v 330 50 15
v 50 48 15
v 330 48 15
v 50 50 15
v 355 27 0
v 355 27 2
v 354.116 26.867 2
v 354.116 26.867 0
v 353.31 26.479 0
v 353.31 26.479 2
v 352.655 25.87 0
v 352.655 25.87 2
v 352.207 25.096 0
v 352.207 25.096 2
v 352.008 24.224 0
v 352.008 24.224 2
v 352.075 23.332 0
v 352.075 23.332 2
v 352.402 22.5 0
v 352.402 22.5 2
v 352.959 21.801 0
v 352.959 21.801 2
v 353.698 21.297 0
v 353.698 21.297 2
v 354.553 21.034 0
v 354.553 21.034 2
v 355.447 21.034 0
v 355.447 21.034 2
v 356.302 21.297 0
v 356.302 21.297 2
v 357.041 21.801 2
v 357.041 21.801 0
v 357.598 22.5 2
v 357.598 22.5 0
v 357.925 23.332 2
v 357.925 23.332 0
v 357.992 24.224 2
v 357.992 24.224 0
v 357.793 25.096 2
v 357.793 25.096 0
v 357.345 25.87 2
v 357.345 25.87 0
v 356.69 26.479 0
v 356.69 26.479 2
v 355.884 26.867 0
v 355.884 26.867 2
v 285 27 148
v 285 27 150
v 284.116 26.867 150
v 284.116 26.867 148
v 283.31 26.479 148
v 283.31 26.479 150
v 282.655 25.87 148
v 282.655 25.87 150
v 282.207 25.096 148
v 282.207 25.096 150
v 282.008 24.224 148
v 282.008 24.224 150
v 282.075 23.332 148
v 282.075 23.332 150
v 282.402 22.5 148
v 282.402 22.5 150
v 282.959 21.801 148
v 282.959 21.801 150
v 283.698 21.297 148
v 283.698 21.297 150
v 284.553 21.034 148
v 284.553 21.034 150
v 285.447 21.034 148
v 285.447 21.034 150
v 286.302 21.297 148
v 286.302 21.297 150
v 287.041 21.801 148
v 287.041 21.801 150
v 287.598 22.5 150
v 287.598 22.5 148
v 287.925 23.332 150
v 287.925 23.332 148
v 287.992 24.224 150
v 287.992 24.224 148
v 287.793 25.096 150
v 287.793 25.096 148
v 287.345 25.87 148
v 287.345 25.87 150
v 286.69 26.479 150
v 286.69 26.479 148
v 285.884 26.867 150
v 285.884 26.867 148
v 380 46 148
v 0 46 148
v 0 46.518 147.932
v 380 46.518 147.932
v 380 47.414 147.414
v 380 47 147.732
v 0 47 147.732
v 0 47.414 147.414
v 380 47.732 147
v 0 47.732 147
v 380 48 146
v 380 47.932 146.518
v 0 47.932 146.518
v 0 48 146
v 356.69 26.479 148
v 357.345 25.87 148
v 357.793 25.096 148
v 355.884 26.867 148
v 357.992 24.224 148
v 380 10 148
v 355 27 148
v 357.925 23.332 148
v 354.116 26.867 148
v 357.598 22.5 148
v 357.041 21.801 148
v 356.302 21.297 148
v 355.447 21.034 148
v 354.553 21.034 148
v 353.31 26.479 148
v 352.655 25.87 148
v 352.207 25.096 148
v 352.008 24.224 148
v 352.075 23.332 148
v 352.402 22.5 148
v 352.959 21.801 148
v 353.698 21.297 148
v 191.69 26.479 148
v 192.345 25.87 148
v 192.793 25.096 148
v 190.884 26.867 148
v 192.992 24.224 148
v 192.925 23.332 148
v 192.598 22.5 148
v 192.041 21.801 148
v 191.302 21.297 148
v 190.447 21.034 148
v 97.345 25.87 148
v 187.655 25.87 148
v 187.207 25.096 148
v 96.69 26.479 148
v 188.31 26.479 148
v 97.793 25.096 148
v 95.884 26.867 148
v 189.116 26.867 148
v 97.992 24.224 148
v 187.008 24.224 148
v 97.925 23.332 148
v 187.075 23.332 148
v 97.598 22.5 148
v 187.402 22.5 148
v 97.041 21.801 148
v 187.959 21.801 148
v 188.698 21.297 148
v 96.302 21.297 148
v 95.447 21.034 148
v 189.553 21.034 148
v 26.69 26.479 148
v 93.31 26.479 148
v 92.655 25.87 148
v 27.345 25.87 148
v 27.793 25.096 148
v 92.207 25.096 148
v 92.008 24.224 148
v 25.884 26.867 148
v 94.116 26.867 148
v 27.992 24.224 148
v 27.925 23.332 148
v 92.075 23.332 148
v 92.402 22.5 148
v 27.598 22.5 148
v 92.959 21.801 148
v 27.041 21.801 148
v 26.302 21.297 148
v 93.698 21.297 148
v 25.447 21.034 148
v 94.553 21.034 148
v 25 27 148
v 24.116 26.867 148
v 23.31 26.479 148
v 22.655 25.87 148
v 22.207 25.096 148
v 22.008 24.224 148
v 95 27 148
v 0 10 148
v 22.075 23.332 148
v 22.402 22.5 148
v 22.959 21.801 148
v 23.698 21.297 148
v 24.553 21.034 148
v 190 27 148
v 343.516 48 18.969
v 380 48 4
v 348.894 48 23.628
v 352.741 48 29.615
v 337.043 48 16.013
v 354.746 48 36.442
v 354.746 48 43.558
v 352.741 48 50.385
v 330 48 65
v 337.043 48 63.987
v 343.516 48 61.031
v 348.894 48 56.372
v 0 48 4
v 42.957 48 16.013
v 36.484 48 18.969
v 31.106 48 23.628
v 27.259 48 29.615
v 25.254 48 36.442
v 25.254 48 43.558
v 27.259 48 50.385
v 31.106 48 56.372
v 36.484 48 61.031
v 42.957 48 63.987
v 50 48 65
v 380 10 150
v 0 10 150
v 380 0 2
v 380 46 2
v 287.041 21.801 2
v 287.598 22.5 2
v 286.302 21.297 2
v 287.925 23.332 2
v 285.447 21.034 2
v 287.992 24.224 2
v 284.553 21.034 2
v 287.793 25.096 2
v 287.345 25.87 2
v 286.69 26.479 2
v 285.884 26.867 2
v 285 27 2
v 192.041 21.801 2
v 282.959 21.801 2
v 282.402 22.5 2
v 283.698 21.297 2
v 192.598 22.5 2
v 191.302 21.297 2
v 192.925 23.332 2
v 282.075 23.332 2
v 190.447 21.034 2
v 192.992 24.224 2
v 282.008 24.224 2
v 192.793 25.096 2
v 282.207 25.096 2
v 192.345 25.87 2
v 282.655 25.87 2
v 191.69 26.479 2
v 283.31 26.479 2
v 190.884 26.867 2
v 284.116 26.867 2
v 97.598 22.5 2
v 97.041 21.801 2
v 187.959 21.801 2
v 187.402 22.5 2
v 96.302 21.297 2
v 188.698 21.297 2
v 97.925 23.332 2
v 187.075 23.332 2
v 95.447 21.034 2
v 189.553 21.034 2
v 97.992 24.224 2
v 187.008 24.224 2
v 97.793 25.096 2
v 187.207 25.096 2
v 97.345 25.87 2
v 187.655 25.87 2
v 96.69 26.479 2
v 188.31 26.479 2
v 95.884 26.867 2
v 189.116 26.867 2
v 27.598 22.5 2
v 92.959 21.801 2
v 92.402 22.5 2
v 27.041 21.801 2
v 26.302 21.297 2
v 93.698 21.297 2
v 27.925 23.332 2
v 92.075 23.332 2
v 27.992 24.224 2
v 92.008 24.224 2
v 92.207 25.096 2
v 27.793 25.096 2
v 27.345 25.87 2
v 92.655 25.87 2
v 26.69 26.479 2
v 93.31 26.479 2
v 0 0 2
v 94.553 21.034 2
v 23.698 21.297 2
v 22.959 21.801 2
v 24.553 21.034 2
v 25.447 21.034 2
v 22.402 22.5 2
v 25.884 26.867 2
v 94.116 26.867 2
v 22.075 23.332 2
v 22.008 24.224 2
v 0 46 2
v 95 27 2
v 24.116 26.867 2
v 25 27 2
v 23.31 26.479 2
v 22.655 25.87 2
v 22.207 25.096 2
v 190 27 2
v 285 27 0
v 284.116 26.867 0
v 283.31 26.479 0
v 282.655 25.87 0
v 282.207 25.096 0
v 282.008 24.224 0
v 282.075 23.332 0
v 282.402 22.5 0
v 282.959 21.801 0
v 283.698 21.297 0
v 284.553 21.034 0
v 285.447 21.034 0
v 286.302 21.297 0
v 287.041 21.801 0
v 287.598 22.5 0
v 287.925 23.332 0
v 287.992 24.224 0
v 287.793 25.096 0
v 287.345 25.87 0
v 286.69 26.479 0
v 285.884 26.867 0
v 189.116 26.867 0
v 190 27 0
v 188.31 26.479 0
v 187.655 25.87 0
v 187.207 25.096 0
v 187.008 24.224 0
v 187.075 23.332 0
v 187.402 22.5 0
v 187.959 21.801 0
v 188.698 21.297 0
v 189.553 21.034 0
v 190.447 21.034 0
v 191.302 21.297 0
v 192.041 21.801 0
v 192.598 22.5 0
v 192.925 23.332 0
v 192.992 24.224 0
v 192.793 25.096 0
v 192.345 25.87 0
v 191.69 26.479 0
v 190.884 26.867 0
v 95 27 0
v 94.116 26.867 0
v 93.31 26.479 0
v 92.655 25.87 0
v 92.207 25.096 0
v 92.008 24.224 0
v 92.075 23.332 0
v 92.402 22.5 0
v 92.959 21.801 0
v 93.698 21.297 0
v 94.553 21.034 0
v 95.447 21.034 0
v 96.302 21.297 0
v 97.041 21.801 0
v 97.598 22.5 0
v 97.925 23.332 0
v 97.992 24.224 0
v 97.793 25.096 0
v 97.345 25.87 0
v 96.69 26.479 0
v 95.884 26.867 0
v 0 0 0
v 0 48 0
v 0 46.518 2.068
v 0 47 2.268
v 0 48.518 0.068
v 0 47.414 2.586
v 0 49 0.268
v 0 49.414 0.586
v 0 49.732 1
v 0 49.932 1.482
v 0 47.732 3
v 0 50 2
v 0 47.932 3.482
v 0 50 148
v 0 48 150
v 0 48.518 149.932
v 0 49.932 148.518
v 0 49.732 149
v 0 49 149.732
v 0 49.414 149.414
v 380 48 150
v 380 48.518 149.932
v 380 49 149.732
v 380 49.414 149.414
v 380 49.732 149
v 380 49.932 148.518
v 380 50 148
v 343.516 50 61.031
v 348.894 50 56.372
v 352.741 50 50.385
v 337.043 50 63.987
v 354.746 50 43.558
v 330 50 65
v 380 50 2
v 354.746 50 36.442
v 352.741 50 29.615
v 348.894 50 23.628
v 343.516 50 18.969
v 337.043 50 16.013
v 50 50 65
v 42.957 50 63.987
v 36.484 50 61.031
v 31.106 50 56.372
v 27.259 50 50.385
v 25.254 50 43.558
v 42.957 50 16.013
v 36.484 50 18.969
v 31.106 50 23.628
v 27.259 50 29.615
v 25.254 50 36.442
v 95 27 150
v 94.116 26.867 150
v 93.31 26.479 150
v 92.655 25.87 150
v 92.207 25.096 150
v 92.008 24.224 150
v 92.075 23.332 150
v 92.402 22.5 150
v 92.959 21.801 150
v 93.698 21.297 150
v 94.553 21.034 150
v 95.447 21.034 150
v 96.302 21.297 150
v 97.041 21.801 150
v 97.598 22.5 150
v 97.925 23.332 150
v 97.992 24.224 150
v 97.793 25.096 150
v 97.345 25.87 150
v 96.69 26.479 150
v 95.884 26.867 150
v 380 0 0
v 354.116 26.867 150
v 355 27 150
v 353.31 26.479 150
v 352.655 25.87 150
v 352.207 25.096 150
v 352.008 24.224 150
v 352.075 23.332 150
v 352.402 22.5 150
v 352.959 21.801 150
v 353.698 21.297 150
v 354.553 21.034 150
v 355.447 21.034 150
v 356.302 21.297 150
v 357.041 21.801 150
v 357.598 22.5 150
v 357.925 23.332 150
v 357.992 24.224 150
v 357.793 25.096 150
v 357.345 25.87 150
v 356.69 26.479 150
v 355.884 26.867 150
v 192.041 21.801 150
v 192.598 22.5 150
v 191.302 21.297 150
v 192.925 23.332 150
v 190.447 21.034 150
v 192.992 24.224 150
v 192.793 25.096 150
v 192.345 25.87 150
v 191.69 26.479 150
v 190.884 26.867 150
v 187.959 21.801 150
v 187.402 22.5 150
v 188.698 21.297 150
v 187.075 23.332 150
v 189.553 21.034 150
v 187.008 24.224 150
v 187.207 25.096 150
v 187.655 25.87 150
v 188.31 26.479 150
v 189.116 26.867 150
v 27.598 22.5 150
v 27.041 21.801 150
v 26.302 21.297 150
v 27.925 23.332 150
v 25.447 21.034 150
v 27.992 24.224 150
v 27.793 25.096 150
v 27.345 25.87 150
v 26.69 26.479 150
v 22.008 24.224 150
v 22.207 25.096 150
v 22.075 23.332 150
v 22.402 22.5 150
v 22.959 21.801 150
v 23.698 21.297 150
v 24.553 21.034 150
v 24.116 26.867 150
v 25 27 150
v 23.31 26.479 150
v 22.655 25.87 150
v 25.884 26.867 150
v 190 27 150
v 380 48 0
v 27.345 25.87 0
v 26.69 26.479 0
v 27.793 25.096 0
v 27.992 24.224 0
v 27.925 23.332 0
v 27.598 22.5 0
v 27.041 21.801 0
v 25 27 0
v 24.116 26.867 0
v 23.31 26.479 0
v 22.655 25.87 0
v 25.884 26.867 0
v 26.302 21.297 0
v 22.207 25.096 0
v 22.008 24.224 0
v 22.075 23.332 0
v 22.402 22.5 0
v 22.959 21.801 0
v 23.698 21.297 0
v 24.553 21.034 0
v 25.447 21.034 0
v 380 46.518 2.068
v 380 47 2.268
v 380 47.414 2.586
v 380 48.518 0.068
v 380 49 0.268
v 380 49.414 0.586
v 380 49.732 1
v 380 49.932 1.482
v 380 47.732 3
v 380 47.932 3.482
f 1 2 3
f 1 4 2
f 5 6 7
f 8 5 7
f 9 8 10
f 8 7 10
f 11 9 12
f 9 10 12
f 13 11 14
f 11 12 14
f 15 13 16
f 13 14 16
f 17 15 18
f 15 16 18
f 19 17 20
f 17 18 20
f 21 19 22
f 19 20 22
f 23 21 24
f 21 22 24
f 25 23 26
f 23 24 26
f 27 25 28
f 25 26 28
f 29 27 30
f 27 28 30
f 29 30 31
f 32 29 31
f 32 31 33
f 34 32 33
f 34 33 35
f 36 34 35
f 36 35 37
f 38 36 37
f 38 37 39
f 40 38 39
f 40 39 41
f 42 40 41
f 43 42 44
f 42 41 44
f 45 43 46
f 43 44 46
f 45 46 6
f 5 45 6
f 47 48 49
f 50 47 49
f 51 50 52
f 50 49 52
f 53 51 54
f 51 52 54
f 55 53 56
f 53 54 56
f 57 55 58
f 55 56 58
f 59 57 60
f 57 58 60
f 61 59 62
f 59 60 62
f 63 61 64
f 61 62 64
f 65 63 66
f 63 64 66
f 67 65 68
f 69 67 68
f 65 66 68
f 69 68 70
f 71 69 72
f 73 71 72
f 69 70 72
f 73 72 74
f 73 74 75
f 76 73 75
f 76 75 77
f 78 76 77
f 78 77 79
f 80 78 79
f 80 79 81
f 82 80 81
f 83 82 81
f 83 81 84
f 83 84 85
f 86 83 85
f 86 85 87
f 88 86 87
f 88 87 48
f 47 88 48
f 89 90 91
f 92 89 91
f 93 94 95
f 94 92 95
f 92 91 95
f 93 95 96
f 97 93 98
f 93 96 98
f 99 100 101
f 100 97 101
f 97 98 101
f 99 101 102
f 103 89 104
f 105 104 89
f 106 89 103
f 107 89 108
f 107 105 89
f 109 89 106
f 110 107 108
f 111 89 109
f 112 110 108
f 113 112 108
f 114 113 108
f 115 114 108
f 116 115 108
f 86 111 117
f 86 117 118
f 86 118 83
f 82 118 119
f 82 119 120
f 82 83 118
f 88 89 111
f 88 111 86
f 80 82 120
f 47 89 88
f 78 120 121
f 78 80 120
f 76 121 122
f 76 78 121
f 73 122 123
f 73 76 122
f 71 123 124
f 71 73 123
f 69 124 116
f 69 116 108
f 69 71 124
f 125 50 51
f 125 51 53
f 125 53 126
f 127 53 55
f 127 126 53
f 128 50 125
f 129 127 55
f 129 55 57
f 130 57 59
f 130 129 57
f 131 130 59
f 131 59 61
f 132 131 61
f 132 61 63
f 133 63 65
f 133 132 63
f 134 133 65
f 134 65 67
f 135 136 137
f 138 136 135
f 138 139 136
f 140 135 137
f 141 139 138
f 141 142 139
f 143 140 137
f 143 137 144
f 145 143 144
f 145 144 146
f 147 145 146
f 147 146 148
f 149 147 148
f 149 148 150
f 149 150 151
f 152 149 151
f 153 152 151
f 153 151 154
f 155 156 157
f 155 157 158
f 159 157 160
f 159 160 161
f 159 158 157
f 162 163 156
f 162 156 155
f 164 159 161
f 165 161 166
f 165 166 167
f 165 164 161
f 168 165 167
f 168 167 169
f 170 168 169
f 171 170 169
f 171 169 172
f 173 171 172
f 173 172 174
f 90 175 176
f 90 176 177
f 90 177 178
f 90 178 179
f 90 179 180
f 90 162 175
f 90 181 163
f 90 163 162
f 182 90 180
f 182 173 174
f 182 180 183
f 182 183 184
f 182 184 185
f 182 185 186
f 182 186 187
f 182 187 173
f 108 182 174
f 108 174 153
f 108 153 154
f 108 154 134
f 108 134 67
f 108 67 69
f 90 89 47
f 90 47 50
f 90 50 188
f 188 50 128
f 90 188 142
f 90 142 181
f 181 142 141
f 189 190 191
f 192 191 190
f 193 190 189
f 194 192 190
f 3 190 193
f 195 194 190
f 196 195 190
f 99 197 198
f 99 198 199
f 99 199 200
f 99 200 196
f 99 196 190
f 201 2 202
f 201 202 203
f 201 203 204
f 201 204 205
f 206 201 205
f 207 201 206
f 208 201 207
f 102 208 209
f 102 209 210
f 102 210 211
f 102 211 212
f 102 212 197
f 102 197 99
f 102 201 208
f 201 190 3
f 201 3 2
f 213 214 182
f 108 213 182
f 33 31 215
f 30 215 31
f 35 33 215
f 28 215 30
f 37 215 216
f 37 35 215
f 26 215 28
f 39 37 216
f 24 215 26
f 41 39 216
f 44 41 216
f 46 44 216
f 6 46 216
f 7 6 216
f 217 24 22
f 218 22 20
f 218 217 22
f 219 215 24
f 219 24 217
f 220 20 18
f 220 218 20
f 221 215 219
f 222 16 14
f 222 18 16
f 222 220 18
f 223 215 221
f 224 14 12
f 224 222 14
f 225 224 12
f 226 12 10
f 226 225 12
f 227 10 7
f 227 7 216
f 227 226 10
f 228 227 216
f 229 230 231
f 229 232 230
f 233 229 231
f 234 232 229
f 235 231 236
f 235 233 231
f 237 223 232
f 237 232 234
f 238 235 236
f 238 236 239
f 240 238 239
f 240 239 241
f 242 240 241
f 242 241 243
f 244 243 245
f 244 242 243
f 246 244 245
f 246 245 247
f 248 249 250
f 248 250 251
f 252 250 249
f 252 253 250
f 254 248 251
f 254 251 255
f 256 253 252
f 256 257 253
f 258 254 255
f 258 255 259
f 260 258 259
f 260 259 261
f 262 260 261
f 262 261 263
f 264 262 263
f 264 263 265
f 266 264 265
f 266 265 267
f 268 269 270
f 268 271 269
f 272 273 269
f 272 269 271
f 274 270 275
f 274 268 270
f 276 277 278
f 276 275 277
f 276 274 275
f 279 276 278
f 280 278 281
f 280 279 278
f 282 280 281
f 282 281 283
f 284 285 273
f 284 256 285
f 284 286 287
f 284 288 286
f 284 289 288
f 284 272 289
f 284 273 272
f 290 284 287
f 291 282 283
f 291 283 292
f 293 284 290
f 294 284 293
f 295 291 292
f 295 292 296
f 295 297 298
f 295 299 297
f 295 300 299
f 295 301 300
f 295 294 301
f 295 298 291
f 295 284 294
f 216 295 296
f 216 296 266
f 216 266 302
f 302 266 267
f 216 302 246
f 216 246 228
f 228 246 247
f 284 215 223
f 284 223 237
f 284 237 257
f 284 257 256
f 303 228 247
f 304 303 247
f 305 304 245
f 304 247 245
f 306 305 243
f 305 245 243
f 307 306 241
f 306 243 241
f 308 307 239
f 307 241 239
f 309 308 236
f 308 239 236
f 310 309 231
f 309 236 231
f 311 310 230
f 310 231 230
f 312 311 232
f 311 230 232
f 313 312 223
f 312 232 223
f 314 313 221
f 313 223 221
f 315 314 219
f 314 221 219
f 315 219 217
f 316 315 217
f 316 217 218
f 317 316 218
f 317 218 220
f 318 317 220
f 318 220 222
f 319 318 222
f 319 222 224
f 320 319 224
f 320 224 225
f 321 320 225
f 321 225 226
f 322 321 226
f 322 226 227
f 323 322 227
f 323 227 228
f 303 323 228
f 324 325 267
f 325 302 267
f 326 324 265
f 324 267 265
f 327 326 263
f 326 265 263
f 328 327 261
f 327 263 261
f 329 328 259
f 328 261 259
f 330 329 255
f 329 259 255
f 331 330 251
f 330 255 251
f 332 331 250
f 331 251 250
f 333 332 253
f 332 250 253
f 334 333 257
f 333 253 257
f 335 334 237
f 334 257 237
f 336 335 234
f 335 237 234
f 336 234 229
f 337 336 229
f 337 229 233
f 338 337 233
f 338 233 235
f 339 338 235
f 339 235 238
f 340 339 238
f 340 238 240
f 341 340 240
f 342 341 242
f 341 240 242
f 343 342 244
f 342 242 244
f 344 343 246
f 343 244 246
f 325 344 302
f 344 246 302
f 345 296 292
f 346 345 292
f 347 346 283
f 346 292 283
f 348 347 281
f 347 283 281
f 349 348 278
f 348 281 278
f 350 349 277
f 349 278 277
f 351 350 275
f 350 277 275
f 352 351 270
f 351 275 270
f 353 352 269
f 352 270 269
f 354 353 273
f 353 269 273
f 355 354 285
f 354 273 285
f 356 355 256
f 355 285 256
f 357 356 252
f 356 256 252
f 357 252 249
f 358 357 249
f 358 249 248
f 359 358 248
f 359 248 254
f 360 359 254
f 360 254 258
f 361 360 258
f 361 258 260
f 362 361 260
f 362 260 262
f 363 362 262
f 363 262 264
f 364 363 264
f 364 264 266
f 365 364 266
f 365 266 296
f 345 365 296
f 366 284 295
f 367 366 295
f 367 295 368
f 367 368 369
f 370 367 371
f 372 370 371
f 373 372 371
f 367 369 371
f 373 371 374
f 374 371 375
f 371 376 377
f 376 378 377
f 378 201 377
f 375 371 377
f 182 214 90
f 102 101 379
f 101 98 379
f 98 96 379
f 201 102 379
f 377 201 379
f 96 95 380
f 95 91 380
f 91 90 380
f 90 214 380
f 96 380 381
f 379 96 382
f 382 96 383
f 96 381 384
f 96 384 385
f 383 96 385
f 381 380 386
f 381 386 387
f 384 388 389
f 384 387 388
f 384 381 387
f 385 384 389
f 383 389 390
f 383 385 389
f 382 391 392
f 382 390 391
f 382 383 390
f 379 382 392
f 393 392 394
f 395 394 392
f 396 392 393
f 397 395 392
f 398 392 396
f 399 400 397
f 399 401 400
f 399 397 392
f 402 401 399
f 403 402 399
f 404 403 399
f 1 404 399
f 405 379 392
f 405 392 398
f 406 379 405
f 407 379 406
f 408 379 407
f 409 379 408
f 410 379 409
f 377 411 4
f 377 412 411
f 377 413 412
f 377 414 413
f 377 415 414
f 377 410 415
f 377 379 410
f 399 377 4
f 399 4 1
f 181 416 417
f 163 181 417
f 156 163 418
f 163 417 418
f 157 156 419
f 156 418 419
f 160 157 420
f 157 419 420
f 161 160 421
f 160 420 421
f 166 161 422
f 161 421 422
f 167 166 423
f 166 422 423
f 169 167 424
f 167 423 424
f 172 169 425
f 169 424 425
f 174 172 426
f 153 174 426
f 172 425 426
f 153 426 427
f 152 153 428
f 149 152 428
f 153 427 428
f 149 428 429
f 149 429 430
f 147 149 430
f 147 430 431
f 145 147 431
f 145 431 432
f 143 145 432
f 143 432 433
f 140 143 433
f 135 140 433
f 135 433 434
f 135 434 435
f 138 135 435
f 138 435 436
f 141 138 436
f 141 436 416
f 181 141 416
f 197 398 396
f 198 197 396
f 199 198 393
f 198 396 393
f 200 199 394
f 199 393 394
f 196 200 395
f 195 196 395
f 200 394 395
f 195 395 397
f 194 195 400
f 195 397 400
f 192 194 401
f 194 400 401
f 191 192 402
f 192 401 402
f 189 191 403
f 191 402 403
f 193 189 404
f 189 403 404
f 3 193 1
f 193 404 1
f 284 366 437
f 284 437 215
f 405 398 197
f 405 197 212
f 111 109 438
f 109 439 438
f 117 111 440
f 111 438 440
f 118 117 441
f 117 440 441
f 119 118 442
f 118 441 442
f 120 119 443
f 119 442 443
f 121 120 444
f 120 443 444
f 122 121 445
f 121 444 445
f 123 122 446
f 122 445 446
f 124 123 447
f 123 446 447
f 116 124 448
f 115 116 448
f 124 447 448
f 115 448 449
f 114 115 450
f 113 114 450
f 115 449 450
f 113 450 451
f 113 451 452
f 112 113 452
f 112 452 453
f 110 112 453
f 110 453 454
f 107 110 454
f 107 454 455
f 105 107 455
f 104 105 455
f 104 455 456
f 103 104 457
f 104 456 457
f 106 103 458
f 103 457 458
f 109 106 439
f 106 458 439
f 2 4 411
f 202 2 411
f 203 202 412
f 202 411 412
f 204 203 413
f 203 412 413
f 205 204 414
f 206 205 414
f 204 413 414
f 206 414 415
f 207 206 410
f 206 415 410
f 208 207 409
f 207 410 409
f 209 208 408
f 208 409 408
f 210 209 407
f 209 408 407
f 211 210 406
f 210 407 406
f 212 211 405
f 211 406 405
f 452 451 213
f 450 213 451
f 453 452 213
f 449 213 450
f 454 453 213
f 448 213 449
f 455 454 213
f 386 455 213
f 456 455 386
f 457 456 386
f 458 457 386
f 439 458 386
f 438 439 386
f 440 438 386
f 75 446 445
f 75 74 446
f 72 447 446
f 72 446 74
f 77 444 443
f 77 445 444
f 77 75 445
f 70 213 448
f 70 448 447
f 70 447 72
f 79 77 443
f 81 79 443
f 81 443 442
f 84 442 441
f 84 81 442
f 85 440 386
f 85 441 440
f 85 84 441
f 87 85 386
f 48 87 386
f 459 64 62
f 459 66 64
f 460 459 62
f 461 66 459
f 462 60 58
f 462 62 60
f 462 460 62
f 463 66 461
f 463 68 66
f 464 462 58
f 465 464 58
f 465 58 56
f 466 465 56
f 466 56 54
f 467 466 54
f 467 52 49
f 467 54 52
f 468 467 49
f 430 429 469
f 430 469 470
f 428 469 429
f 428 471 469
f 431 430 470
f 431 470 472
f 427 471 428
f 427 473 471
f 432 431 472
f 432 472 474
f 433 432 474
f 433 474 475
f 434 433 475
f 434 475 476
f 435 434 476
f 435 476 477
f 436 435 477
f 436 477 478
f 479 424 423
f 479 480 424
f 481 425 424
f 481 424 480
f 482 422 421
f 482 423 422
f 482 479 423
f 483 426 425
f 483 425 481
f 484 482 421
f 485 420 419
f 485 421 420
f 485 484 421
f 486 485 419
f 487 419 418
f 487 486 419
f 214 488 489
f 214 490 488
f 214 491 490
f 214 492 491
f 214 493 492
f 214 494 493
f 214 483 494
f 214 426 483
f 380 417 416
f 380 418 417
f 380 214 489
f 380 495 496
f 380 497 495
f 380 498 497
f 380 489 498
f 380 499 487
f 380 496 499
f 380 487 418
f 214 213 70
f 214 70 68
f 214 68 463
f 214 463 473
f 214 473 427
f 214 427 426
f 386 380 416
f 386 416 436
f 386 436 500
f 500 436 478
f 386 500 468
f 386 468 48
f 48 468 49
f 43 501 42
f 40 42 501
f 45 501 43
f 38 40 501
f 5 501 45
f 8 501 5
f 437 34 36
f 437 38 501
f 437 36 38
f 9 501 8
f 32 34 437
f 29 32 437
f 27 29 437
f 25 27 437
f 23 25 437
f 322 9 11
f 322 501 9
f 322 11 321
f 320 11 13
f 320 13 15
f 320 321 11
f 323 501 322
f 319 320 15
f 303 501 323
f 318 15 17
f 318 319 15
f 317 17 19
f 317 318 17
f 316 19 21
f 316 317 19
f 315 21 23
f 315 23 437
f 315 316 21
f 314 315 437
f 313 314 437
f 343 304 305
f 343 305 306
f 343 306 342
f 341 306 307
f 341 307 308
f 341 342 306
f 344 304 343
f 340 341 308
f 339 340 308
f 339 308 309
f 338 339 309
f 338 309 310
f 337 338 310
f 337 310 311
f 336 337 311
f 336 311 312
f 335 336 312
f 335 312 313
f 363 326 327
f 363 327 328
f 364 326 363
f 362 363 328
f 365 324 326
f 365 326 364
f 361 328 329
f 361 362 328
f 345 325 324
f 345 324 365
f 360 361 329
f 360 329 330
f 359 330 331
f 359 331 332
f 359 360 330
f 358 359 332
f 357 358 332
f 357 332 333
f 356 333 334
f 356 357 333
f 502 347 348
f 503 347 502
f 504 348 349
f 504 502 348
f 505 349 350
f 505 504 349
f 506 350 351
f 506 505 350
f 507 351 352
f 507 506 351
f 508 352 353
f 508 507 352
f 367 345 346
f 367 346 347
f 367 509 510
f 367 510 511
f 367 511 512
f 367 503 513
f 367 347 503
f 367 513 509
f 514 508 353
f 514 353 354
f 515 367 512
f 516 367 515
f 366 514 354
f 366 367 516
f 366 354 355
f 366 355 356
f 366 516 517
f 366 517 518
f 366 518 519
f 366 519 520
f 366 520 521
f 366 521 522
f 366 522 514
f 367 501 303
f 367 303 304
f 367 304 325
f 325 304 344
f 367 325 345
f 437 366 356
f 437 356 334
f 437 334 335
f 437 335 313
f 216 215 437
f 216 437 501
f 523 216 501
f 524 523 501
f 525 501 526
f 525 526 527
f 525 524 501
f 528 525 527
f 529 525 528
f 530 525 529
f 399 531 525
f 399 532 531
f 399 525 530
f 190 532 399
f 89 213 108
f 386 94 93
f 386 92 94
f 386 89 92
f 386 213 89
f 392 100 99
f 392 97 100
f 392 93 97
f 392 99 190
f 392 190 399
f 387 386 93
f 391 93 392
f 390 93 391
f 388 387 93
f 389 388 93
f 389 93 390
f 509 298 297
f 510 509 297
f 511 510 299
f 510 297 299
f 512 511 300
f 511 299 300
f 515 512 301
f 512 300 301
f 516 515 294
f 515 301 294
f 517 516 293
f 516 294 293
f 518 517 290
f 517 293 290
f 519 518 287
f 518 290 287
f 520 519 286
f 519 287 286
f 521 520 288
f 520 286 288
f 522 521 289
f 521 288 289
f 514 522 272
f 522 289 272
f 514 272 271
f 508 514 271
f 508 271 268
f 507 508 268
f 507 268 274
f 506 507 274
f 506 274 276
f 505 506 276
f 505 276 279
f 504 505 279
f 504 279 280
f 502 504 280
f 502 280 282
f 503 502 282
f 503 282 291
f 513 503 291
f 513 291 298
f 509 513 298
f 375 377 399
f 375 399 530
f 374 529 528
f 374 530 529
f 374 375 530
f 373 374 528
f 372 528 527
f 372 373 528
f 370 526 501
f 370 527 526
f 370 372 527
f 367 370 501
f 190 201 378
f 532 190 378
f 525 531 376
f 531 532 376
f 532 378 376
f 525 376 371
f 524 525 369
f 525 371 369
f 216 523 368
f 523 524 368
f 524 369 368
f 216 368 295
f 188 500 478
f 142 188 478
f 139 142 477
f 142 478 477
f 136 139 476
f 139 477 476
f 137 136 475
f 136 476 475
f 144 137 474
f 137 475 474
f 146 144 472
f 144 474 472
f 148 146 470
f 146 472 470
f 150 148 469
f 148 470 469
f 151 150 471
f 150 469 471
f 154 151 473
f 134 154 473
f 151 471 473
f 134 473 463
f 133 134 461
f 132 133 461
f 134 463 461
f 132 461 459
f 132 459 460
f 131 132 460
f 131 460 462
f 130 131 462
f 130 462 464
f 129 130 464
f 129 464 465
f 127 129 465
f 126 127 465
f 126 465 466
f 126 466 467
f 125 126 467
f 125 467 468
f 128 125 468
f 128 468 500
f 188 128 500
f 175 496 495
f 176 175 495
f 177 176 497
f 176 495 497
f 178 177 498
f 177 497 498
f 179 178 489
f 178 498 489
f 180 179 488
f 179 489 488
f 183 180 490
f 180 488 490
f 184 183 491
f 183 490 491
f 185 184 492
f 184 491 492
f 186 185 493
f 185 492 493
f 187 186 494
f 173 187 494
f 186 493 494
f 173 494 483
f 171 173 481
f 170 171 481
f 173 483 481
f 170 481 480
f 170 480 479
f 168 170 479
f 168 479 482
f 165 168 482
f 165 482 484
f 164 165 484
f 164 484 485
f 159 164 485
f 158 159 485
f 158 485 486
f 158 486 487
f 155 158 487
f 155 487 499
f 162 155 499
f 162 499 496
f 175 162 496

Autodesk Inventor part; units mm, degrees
ref_plane "YZ Plane" through (0, 0, 0) normal (1, 0, 0) x (0, 1, 0)
ref_plane "XZ Plane" through (0, 0, 0) normal (0, 1, 0) x (-1, 0, 0)
ref_plane "XY Plane" through (0, 0, 0) normal (0, 0, 1) x (1, 0, 0)
sketch "Sketch1" plane through (0, 0, 0) normal (1, 0, 0) x (0, 1, 0)
  line L0 (10, 150) -> (48, 150)
  line L1 (50, 148) -> (50, 2)
  line L2 (48, 0) -> (0, 0)
  line L3 (0, 2) -> (46, 2)
  line L4 (48, 4) -> (48, 146)
  line L5 (46, 148) -> (10, 148)
  line L6 (0, 0) -> (0, 2)
  line L7 (10, 150) -> (10, 148)
  arc A0 (48, 146) -> (46, 148) centre (46, 146) ccw
  arc A1 (50, 148) -> (48, 150) centre (48, 148) ccw
  arc A2 (48, 0) -> (50, 2) centre (48, 2) ccw
  arc A3 (46, 2) -> (48, 4) centre (46, 4) ccw
  point P0 (50, 150)
  point P1 (50, 0)
  dimension "d0" = 40
  dimension "d1" = 150
  dimension "d2" = 50
  dimension "d3" = 2
  dimension "d4" = 2
extrude "Extrusion1" add sketch "Sketch1" along normal blind 380
sketch "Sketch2" plane through (0, 50, 148) normal (0, 1, 0) x (1, 0, 0)
  line L0 (330, 108) -> (50, 108) construction
  line L1 (330, 83) -> (50, 83)
  line L2 (50, 133) -> (330, 133)
  arc A0 (330, 83) -> (330, 133) centre (330, 108) ccw
  arc A1 (50, 133) -> (50, 83) centre (50, 108) ccw
  line L3 (0, 146) -> (380, 146) projected
  line L4 (0, 144) -> (0, 2) projected
  line L5 (380, 146) -> (380, 0) projected
  line L6 (0, 148) -> (380, 148) projected
  point P0 (190, 108)
  dimension "d7" = 280
  dimension "d8" = 190
  dimension "d9" = 50
  dimension "d10" = 40
extrude "Extrusion2" cut sketch "Sketch2" against normal up to surface (2 mm away)
sketch "Sketch3" plane through (0, 0, 0) normal (0, 0, -1) x (-1, 0, 0)
  line L0 (0, 0) -> (-380, 0) projected
  line L1 (-380, 0) -> (-380, 48) projected
  point P0 (-355, 24)
  point P1 (-285, 24)
  point P2 (-190, 24)
  point P3 (-25, 24)
  point P4 (-95, 24)
  dimension "d13" = 24
  dimension "d14" = 70
  dimension "d15" = 95
  dimension "d16" = 95
  dimension "d17" = 70
  dimension "d18" = 25
hole "Hole1" at (355, 24, 0) at (285, 24, 0) at (190, 24, 0) at (25, 24, 0) at (95, 24, 0) direction (0, 0, 1) diameter 6 end through all
properties part number "SidePanelCoverSpacer"
